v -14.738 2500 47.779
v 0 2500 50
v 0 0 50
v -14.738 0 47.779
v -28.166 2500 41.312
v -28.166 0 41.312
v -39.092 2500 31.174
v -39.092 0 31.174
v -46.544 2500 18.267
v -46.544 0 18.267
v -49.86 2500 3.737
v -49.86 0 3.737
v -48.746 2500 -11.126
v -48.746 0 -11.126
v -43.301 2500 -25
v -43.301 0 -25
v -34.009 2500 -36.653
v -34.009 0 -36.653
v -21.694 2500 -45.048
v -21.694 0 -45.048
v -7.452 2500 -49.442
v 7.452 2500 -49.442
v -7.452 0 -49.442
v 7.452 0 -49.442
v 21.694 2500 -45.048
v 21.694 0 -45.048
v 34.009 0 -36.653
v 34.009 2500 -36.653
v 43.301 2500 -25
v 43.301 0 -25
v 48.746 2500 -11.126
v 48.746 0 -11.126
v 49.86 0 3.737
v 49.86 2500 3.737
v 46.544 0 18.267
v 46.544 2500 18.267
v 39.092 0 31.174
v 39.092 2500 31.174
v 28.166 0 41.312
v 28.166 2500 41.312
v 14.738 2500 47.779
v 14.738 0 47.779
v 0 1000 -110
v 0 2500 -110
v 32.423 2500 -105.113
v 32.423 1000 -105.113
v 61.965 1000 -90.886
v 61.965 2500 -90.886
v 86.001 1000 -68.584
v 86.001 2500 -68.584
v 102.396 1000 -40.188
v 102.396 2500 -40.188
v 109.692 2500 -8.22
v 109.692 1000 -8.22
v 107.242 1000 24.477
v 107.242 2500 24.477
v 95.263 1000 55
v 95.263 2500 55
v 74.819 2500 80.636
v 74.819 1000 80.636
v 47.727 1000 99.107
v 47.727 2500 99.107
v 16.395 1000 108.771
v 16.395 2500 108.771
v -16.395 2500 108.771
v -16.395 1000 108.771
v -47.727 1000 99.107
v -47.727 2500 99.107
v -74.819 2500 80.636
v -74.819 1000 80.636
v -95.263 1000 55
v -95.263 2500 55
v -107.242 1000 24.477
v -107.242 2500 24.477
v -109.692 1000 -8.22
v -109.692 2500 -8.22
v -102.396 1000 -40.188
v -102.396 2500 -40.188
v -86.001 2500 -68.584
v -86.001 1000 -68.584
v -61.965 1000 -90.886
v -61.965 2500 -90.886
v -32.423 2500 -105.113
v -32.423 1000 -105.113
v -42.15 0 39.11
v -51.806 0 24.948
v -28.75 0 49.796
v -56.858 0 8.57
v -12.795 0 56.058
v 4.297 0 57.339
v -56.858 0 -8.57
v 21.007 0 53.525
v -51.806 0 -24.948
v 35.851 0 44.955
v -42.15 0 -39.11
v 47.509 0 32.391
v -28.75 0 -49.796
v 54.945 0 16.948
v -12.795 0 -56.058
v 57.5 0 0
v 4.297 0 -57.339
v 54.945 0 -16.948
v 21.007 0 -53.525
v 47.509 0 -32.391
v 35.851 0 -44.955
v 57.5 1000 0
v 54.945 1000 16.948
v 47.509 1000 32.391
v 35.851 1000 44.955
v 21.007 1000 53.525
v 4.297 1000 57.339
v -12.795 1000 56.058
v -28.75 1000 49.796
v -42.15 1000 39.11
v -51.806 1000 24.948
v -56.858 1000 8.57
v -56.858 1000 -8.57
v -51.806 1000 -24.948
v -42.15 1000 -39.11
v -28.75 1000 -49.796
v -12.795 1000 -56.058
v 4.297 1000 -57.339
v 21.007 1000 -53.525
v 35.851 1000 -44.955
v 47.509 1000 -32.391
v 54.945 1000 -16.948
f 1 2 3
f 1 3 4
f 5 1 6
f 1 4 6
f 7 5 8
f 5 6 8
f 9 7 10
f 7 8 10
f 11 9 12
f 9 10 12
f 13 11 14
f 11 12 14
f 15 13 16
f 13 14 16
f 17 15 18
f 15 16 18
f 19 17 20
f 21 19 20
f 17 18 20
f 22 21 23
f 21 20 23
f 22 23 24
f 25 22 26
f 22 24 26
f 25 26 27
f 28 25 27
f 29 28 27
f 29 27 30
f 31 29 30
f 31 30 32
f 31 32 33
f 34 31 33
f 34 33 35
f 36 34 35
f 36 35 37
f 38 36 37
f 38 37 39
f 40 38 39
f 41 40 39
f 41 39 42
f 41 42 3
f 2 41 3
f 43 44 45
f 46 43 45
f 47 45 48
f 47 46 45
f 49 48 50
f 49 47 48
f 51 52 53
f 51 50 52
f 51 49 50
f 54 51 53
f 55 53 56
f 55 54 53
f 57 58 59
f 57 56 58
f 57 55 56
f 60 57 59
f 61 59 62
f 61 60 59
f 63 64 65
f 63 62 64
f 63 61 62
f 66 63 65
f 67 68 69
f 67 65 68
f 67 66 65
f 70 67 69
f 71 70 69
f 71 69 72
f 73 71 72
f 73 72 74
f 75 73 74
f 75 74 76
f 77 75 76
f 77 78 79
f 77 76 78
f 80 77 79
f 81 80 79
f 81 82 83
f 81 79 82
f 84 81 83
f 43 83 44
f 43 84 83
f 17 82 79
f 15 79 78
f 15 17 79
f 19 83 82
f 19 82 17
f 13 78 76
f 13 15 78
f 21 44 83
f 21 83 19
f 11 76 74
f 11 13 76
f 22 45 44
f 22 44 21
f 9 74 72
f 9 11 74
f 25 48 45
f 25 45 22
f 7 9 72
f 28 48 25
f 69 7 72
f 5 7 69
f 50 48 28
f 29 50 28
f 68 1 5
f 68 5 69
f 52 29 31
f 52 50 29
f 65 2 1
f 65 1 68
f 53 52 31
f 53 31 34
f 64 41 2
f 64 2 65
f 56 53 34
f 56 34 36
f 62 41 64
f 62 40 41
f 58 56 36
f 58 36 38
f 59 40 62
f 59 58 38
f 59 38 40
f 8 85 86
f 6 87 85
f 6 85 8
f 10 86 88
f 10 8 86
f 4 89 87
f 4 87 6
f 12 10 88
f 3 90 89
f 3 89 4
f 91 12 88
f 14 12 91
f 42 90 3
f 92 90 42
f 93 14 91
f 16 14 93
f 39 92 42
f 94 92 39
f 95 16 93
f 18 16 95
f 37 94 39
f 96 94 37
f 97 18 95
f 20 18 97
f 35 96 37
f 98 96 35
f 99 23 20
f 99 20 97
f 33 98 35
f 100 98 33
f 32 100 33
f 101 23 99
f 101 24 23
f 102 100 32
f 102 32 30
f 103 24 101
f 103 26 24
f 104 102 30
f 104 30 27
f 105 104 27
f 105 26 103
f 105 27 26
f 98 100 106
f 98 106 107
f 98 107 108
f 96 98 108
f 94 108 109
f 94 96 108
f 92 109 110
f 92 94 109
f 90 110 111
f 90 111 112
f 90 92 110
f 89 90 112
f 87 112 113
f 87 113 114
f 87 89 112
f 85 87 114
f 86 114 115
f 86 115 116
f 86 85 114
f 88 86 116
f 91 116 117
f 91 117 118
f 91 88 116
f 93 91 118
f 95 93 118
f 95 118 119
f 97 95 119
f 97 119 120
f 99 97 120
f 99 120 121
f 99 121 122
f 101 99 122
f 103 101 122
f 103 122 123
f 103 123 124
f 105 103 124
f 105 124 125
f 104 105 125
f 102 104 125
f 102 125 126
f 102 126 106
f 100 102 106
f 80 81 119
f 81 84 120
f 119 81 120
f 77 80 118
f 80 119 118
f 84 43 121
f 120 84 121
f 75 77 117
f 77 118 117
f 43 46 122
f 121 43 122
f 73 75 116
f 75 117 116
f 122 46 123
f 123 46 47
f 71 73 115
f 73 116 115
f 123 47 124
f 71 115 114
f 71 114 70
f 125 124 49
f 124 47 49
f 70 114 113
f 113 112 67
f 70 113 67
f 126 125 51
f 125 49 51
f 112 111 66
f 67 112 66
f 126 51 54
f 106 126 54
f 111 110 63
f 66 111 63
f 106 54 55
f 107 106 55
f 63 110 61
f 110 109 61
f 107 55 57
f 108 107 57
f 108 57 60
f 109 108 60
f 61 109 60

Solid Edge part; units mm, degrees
sketch "Sketch1" plane through (0, 0, 0) normal (0, -1, 0) x (1, 0, 0)
  circle A0 centre (0, 0) radius 57.5
extrude "Protrusion1" add sketch "Sketch1" against normal blind 1000
sketch "Sketch2" plane through (0, 1000, 0) normal (0, 1, 0) x (0, 0, -1)
  circle A0 centre (0, 0) radius 110
extrude "ExtrudedProtrusion_3" add sketch "Sketch2" along normal blind 1500
sketch "Sketch3" plane through (0, 0, 0) normal (0, -1, 0) x (0, 0, 1)
  circle A0 centre (0, 0) radius 50
extrude "ExtrudedCutout_2" cut sketch "Sketch3" against normal blind 2746.3549
properties material "Galvanized steel"
